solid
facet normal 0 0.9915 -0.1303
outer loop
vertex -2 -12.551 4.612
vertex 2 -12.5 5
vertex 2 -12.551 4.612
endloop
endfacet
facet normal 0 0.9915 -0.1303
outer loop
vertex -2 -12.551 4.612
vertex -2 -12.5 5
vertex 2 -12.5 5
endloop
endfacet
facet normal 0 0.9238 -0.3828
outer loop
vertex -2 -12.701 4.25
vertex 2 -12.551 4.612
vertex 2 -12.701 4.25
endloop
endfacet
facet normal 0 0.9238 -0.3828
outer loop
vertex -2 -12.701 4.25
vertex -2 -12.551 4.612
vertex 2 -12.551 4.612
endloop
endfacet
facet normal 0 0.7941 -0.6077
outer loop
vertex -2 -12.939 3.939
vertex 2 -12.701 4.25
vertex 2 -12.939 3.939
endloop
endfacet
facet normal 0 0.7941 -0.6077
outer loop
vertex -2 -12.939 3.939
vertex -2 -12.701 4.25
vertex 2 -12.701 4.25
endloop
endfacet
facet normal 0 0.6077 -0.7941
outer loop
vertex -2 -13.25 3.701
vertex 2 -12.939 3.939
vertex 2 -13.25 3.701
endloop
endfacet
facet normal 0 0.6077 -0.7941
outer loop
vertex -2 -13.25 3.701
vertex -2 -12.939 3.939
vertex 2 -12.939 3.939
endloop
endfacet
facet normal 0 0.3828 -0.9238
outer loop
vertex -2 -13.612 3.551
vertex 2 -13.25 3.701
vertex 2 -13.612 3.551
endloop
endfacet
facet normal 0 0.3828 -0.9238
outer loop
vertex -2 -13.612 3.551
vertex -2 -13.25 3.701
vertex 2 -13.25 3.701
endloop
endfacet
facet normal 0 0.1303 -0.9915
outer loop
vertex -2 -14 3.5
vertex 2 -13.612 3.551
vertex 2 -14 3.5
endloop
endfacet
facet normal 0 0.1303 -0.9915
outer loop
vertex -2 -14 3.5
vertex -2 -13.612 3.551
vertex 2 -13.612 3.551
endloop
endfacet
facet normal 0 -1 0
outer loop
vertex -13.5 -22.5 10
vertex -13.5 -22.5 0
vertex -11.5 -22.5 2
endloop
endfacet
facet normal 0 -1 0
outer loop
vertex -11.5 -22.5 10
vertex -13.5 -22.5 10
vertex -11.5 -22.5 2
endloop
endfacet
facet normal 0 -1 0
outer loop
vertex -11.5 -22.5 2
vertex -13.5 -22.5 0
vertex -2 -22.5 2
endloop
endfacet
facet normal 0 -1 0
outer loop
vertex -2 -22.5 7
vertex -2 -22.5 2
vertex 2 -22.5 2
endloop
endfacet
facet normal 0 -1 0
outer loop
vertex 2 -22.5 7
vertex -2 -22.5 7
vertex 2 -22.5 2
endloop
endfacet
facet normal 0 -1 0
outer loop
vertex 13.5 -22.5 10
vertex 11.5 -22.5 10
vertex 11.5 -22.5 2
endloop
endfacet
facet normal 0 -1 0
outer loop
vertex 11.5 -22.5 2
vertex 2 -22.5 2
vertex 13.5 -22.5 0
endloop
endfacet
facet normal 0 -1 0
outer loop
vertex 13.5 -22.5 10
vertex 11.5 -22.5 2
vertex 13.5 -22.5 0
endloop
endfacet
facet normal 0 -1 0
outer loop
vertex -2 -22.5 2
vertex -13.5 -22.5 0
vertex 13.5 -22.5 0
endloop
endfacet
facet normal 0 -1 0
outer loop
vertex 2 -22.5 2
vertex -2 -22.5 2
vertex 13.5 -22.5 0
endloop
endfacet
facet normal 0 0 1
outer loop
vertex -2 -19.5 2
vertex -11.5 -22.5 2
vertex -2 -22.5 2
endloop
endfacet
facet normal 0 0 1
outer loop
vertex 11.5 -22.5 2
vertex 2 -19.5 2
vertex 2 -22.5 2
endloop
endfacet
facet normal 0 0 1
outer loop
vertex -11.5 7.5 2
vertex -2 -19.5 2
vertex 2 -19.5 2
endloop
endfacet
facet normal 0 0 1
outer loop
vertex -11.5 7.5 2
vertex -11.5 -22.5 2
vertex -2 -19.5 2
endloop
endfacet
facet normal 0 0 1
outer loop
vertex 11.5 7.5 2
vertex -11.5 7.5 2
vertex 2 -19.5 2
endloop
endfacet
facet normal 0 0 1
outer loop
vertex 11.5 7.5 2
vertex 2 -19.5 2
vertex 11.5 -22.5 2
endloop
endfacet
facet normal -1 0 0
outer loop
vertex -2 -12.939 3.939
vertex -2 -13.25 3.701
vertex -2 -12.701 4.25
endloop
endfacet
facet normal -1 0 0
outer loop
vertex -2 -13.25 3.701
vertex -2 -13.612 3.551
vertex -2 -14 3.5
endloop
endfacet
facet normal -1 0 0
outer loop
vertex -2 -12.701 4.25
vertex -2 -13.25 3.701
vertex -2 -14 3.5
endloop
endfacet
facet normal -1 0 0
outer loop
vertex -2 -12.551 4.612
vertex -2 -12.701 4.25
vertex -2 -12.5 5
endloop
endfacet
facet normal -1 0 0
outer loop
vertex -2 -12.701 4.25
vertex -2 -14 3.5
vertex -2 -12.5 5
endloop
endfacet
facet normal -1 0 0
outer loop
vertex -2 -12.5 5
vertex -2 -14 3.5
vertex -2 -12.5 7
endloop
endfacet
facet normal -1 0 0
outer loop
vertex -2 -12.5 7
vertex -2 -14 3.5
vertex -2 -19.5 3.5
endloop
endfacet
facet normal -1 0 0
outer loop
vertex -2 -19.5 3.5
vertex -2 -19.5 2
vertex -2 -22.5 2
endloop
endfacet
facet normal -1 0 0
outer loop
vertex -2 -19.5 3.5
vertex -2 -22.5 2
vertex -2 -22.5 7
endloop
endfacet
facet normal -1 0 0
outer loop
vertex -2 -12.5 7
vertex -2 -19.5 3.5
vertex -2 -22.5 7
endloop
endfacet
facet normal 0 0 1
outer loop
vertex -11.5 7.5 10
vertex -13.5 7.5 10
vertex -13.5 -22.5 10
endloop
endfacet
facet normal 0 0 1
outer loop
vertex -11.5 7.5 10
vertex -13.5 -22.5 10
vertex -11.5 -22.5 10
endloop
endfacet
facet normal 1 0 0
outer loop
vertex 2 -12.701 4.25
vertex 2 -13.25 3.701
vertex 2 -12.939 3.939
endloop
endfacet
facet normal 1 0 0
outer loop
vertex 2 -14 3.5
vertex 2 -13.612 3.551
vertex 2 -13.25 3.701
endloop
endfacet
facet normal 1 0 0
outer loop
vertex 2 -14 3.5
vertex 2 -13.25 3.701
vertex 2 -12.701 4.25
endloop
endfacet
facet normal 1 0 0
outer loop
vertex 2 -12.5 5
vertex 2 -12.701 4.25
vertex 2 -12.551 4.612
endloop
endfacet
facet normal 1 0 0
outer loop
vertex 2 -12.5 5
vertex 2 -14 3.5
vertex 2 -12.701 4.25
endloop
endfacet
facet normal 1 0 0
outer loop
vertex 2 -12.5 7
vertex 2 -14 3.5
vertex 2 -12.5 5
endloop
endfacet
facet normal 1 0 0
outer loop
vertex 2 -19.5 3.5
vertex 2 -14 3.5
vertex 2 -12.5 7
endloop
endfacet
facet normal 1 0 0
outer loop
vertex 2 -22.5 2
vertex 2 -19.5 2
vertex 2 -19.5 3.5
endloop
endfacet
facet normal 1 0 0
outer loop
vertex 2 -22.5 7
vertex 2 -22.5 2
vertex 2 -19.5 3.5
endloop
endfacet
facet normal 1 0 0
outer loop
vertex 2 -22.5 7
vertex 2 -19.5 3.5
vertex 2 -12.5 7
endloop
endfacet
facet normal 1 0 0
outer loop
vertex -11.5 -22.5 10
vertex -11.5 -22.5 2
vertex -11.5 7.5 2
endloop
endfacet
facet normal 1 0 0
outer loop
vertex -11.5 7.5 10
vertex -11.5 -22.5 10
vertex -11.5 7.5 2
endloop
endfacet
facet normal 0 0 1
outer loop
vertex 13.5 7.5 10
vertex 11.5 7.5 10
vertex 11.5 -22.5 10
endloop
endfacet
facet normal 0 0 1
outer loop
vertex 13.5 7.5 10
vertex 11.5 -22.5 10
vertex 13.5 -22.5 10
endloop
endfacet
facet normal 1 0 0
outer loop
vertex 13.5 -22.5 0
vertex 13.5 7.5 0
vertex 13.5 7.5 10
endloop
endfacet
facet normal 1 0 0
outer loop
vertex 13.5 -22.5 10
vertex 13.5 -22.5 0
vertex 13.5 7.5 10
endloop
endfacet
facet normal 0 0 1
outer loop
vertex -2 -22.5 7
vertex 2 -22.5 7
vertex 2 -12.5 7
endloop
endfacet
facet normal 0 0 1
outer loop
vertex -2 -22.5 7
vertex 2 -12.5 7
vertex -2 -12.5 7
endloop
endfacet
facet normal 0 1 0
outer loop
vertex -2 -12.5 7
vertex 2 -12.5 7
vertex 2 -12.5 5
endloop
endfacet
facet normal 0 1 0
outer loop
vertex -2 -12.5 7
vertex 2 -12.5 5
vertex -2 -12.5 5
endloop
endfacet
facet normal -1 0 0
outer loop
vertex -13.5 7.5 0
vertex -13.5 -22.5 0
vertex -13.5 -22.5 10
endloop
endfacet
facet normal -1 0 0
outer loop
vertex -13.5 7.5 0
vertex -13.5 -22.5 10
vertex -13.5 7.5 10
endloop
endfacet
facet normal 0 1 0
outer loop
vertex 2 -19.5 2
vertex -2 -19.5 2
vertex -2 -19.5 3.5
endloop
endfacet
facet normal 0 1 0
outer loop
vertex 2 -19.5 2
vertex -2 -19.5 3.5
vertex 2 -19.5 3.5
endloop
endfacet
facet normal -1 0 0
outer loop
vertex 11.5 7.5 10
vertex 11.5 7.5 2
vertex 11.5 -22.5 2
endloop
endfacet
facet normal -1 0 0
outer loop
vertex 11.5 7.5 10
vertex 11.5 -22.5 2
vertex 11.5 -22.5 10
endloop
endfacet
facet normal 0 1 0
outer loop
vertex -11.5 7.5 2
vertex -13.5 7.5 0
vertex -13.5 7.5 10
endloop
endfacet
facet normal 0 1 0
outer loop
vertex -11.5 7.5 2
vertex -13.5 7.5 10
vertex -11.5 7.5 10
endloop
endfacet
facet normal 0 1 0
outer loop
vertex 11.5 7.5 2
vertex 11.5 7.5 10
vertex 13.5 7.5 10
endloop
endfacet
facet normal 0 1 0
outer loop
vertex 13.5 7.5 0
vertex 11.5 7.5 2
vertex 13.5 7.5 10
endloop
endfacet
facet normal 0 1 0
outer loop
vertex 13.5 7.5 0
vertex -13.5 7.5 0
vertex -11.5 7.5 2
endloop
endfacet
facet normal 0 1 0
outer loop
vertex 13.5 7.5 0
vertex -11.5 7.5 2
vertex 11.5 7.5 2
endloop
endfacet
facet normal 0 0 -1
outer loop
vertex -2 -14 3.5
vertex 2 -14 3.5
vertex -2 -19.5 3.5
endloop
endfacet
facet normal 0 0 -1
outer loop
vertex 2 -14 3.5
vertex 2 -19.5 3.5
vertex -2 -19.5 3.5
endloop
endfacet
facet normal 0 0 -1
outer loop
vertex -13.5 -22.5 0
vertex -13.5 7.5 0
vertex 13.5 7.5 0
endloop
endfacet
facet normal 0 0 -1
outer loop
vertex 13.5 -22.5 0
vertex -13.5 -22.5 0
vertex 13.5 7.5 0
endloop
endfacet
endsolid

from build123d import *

# Parameters (mm, degrees)
F1_DEPTH  = 2
F0_W      = 2
F0_H      = 35
F2_DEPTH  = 10
F0_W_2    = 4
F0_H_2    = 5
F3_DEPTH  = 7
F4_W      = 4
F4_H      = 3.5
F5_DEPTH  = 5
F6_R      = 1.5
F7_DEPTH  = 2
F8_DEPTH  = 5
F9_DEPTH  = 5
F10_DEPTH = 5


with BuildPart() as f1:
    # F0 (on Top) → F1 (new body)
    with BuildSketch(Plane.XY):
        Polygon((11.5, 17.5), (-11.5, 17.5), (-11.5, -17.5), (-2, -17.5), (2, -17.5), (11.5, -17.5), align=None)
    extrude(amount=F1_DEPTH)

    # F0 (on Top) → F2 (join)
    with BuildSketch(Plane.XY):
        with Locations((-12.5, 0)):
            Rectangle(F0_W, F0_H)
        with Locations((12.5, 0)):
            Rectangle(F0_W, F0_H)
    extrude(amount=F2_DEPTH)

    # F0 (on Top) → F3 (join)
    with BuildSketch(Plane.XY):
        with Locations((0, -20)):
            Rectangle(F0_W_2, F0_H_2)
    extrude(amount=F3_DEPTH)

    # F4 (on face) → F5 (join)
    with BuildSketch(Plane(origin=(0, -17.5, 0), x_dir=(-1, 0, 0), z_dir=(0, 1, 0))):
        with Locations((0, 5.25)):
            Rectangle(F4_W, F4_H)
    extrude(amount=F5_DEPTH)

    # F6
    f6_edges = [f1.edges().sort_by_distance(p)[0] for p in [
        (0, -12.5, 3.5),
    ]]
    fillet(f6_edges, radius=F6_R)

    # F7 (cut): a face of the model
    f7_faces = [f1.faces().sort_by_distance(p)[0] for p in [
        (0, -17.5, 2.75),
    ]]
    extrude(f7_faces, amount=-F7_DEPTH, mode=Mode.SUBTRACT)

    # F8 (cut): a face of the model
    f8_faces = [f1.faces().sort_by_distance(p)[0] for p in [
        (0, 17.5, 0.287923601),
    ]]
    extrude(f8_faces, amount=-F8_DEPTH, mode=Mode.SUBTRACT)

    # F9 (add): faces of the model
    f9_faces = [f1.faces().sort_by_distance(p)[0] for p in [
        (6.75, -17.5, 1.8476024935),
        (-6.75, -17.5, 1.8476024935),
    ]]
    extrude(f9_faces, amount=F9_DEPTH)

    # F10 (cut): a face of the model
    f10_faces = [f1.faces().sort_by_distance(p)[0] for p in [
        (0, 12.5, 0.287923601),
    ]]
    extrude(f10_faces, amount=-F10_DEPTH, mode=Mode.SUBTRACT)


solid = f1.part
